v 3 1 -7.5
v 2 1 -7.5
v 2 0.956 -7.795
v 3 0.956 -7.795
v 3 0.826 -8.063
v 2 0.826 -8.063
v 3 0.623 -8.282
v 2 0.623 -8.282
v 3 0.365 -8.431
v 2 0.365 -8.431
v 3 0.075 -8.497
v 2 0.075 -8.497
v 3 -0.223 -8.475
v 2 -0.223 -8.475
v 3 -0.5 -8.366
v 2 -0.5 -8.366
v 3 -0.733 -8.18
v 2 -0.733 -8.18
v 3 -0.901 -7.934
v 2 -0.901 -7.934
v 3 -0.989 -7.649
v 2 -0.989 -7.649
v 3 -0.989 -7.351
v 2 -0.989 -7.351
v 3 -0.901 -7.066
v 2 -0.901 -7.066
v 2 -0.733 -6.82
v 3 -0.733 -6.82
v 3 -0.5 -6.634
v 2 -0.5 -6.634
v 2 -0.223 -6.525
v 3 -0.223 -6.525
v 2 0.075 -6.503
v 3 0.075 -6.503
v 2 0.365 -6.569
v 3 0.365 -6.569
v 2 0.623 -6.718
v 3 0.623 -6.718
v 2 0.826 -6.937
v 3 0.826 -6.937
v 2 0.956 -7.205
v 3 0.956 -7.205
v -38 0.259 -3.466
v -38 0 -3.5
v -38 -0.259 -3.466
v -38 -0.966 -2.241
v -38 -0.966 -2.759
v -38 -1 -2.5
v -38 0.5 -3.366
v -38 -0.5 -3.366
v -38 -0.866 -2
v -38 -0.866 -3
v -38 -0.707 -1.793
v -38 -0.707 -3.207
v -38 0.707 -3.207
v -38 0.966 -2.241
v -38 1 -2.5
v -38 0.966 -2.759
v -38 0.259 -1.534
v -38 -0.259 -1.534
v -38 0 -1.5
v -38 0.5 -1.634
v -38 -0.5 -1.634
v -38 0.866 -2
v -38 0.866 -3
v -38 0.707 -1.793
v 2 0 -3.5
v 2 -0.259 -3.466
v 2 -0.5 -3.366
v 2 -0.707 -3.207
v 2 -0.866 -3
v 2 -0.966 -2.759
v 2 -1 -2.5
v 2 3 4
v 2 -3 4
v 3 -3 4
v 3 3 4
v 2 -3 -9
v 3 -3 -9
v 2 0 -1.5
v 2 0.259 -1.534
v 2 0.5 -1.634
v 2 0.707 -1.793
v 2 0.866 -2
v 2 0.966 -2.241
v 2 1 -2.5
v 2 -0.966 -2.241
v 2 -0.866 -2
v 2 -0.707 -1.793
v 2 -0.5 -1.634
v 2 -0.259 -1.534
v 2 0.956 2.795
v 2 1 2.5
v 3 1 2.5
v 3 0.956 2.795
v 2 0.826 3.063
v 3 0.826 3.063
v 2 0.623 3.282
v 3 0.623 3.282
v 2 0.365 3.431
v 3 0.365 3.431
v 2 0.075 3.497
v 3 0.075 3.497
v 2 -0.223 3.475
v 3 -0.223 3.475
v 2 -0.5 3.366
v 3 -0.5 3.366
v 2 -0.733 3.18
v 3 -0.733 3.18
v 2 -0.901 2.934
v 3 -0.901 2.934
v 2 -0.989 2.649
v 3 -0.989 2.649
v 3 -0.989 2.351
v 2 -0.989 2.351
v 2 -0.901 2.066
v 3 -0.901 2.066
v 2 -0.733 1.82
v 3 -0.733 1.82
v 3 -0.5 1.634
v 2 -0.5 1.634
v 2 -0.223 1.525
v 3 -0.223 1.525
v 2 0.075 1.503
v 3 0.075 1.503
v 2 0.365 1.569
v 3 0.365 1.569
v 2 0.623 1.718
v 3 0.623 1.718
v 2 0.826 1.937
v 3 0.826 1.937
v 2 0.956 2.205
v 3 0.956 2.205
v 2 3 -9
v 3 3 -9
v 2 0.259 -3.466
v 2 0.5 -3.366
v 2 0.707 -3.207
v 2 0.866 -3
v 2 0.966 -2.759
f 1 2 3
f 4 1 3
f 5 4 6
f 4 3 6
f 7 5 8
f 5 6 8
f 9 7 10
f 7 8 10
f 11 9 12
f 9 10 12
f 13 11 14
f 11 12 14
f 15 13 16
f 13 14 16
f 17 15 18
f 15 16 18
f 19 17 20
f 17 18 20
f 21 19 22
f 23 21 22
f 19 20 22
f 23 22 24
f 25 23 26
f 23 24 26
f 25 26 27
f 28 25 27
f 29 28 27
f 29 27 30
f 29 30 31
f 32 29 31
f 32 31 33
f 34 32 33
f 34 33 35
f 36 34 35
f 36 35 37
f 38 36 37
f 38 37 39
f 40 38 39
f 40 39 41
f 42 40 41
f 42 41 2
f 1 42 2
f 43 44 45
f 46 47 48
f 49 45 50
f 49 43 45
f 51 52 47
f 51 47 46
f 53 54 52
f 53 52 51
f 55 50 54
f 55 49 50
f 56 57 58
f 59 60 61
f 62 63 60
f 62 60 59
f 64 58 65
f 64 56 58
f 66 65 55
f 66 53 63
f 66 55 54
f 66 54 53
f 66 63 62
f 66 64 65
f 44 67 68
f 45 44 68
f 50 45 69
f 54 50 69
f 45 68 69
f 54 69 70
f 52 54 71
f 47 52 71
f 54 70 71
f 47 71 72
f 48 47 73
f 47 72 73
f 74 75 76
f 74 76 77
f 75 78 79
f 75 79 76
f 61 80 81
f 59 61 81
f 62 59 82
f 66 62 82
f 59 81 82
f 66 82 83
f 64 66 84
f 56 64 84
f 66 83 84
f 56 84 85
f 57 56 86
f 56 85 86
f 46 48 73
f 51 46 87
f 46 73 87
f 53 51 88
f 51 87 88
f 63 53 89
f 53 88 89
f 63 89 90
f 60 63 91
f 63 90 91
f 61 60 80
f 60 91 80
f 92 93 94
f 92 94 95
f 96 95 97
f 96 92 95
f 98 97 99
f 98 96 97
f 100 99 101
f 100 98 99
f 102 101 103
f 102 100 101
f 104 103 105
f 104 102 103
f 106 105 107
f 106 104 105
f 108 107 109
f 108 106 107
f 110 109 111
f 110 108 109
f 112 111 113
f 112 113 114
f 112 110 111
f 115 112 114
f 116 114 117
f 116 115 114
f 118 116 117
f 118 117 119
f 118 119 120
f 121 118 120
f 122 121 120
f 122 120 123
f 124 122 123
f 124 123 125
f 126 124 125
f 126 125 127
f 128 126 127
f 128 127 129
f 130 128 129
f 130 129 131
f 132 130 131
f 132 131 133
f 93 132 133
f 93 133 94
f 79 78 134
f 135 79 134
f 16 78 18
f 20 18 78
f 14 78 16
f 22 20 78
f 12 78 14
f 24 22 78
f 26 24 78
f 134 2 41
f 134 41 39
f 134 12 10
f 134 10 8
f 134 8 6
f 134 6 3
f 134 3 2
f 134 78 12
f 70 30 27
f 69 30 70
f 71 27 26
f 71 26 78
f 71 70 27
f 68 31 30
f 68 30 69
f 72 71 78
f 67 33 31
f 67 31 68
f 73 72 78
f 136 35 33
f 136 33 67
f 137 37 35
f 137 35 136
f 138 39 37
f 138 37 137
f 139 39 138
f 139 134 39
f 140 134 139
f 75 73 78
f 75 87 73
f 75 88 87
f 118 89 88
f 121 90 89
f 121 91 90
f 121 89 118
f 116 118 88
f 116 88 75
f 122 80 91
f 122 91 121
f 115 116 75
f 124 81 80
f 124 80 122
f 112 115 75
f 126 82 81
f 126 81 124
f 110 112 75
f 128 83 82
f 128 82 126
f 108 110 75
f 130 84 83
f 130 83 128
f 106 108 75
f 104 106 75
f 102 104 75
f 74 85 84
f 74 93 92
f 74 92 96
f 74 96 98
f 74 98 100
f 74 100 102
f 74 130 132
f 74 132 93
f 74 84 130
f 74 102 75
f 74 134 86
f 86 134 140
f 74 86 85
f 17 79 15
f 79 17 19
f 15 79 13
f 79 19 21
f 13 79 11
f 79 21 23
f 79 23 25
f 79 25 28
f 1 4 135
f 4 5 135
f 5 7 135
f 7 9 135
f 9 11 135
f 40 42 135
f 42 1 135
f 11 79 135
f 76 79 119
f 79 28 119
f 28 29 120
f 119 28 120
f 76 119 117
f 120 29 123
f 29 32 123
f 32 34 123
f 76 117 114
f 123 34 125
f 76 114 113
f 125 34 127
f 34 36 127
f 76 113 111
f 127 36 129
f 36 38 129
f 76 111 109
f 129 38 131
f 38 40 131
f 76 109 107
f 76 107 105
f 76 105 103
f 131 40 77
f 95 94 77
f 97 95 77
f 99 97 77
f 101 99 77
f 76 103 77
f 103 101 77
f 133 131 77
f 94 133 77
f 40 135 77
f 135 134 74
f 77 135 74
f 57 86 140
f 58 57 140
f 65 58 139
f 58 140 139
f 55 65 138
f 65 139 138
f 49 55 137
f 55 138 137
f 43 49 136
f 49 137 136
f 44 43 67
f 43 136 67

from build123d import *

# Parameters (mm, degrees)
SKETCH_1_W          = 4
SKETCH_1_H          = 6
SKETCH_1_R          = 1
EXTRUDE_1_DEPTH     = 1
SKETCH_2_W          = 3
SKETCH_2_H          = 6
SKETCH_2_R          = 1
SKETCH_2_W_2        = 3.5
EXTRUDE_2_DEPTH     = 1
FILLET_1_R          = 1
SKETCH_3_W          = 8.324991738
SKETCH_3_H          = 7.604036572
CUT_EXTRUDE_1_DEPTH = 10
EXTRUDE_3_DEPTH     = 40


with BuildPart() as part:
    # 草图1 → 凸台-拉伸1 (new body)
    with BuildSketch(Plane.XY):
        Rectangle(SKETCH_1_W, SKETCH_1_H)
        Circle(SKETCH_1_R, mode=Mode.SUBTRACT)
    extrude(amount=EXTRUDE_1_DEPTH)

    # 草图2 → 凸台-拉伸2 (add)
    # profile 1 of 2: a face of its own
    with BuildSketch(Plane(origin=(2, 0, 0), x_dir=(0, 0, -1), z_dir=(1, 0, 0))):
        with Locations((-2.5, 0)):
            Rectangle(SKETCH_2_W, SKETCH_2_H)
        with Locations(Location((-2.5, 0, 0), (0, 0, 90))):
            Circle(SKETCH_2_R, mode=Mode.SUBTRACT)
    # profile 2 of 2: a face of its own
    with BuildSketch(Plane(origin=(2, 0, 0), x_dir=(0, 0, -1), z_dir=(1, 0, 0))):
        with Locations((0.75, 0)):
            Rectangle(SKETCH_2_W_2, SKETCH_2_H)
    extrude(amount=EXTRUDE_2_DEPTH)

    # 圆角1
    fillet_1_edges = [part.edges().sort_by_distance(p)[0] for p in [
        (-2, -3, 0.5),
        (-2, 3, 0.5),
    ]]
    fillet(fillet_1_edges, radius=FILLET_1_R)

    # 镜向1: part across plane


with BuildPart() as part_1:
    add(part.part)
    add(part.part.mirror(Plane(origin=(3, 0, -2.5), x_dir=(1, 0, 0), z_dir=(0, 0, 1))))

    # 草图3 → 切除-拉伸1 (cut)
    with BuildSketch(Plane.ZY.offset(-2)):
        with Locations((-2.5, 0)):
            Rectangle(SKETCH_3_W, SKETCH_3_H)
    extrude(amount=CUT_EXTRUDE_1_DEPTH, mode=Mode.SUBTRACT)

    # 草图4 → 凸台-拉伸3 (add)
    with BuildSketch(Plane.ZY.offset(-2)):
        with BuildLine():
            ThreePointArc((-1.5, 0), (-1.792893219, 0.707106781), (-2.5, 1))
            Line((-2.5, 1), (-2.5, 0))
            Line((-2.5, 0), (-1.5, 0))
        make_face()
        with BuildLine():
            Line((-2.5, 0), (-2.5, 1))
            ThreePointArc((-2.5, 1), (-3.207106781, 0.707106781), (-3.5, 0))
            Line((-3.5, 0), (-2.5, 0))
        make_face()
        with BuildLine():
            Line((-1.5, 0), (-2.5, 0))
            Line((-2.5, 0), (-2.5, -1))
            ThreePointArc((-2.5, -1), (-1.792893219, -0.707106781), (-1.5, 0))
        make_face()
        with BuildLine():
            Line((-2.5, -1), (-2.5, 0))
            Line((-2.5, 0), (-3.5, 0))
            ThreePointArc((-3.5, 0), (-3.207106781, -0.707106781), (-2.5, -1))
        make_face()
    extrude(amount=EXTRUDE_3_DEPTH)


solid = part_1.part
